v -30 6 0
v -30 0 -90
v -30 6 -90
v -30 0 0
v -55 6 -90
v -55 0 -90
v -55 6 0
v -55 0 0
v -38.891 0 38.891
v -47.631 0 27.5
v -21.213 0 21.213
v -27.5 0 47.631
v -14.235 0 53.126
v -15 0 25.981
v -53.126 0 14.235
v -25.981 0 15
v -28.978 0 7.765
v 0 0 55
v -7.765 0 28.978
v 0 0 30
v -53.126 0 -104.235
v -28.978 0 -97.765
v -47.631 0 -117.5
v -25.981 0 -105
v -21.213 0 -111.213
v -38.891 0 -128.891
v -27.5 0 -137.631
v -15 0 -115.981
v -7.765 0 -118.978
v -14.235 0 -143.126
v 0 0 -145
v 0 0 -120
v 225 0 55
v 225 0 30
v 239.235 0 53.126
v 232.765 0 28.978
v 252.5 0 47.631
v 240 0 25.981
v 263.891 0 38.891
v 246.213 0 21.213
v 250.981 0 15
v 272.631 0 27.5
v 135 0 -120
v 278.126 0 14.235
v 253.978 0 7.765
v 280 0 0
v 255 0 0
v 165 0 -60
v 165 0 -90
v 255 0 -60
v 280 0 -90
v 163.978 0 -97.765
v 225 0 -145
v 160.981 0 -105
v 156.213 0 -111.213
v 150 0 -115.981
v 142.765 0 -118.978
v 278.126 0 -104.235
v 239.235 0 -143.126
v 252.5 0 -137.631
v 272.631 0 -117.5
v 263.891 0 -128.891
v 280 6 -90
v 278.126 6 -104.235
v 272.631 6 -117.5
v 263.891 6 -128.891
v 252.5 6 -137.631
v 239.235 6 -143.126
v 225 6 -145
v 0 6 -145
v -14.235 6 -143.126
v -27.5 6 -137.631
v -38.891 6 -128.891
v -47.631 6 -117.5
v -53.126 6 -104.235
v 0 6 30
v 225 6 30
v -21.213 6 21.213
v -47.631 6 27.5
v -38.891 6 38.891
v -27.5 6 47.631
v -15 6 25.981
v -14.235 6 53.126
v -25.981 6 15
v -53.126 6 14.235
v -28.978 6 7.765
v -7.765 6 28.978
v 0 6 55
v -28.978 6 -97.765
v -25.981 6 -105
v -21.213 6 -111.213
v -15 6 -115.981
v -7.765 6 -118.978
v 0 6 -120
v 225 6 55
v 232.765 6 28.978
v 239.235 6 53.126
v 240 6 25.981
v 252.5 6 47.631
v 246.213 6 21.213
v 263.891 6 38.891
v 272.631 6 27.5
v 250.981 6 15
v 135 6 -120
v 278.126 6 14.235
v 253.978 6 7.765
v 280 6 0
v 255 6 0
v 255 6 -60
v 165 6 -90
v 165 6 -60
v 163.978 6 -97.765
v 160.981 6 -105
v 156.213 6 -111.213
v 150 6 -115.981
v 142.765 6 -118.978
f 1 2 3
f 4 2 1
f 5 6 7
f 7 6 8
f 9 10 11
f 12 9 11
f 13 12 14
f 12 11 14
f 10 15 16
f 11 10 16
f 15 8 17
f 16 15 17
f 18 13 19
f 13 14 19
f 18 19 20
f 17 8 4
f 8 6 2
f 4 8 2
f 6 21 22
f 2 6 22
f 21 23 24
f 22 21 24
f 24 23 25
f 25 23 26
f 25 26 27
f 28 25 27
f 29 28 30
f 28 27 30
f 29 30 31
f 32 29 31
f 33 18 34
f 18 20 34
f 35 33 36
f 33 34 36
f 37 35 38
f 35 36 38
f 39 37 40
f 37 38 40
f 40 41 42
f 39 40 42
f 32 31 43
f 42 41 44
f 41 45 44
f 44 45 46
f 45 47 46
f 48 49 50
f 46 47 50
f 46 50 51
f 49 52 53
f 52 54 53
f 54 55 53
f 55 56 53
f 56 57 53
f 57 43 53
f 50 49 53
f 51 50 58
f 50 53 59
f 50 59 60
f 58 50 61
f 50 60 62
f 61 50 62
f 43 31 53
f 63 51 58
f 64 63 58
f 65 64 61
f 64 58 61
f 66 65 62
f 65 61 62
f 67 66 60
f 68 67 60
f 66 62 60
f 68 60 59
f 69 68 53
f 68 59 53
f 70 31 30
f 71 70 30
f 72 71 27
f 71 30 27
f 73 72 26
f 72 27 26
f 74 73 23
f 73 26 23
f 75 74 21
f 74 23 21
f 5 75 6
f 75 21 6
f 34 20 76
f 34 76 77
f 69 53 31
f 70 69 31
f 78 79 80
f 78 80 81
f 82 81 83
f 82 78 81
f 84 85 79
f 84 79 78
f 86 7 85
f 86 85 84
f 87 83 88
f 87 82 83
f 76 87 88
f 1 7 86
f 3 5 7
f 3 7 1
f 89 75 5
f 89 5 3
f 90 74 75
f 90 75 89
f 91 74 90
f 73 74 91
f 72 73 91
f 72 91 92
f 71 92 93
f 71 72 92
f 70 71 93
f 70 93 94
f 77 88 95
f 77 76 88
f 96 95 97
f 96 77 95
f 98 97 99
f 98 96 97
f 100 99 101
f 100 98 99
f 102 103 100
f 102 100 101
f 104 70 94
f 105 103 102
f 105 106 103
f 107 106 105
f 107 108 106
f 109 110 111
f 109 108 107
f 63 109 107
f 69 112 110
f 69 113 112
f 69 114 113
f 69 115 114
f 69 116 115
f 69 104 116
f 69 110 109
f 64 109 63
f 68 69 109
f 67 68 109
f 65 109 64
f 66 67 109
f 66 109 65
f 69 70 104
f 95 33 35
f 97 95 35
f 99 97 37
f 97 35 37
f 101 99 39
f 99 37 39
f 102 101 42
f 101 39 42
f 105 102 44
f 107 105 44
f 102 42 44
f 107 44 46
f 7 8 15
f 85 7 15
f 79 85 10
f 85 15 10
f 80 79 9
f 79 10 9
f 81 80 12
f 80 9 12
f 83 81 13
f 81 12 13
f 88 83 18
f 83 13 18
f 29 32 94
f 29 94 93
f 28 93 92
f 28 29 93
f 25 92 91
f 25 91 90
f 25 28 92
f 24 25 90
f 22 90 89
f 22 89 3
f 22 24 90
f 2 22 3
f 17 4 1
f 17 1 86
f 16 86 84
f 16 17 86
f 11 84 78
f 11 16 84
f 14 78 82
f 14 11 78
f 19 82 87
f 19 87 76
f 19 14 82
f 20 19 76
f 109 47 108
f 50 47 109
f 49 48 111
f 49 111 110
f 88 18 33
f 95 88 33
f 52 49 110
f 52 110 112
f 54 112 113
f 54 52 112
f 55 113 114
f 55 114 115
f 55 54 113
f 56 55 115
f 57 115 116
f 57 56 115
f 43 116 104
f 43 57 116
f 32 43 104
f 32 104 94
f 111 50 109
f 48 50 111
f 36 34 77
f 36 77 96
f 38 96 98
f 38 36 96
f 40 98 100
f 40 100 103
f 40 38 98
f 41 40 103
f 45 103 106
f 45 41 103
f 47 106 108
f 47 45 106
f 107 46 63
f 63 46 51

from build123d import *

# Parameters (mm, degrees)
BOSS_EXTRUDE1_DEPTH = 6


with BuildPart() as part:
    # Sketch1 → Boss-Extrude1 (new body)
    with BuildSketch(Plane(origin=(0, 0, 0), x_dir=(1, 0, 0), z_dir=(0, 1, 0))):
        with BuildLine():
            Line((0, -55), (225, -55))
            ThreePointArc((225, -55), (263.890872965, -38.890872965), (280, 0))
            Line((280, 0), (280, 90))
            ThreePointArc((280, 90), (263.890872965, 128.890872965), (225, 145))
            Line((225, 145), (0, 145))
            ThreePointArc((0, 145), (-38.890872965, 128.890872965), (-55, 90))
            Line((-55, 90), (-55, 0))
            ThreePointArc((-55, 0), (-38.890872965, -38.890872965), (0, -55))
        make_face()
        with BuildLine():
            Line((0, -30), (225, -30))
            ThreePointArc((225, -30), (246.213203436, -21.213203436), (255, 0))
            Line((255, 0), (255, 60))
            Line((255, 60), (165, 60))
            Line((165, 60), (165, 90))
            ThreePointArc((165, 90), (156.213203436, 111.213203436), (135, 120))
            Line((135, 120), (0, 120))
            ThreePointArc((0, 120), (-21.213203436, 111.213203436), (-30, 90))
            Line((-30, 90), (-30, 0))
            ThreePointArc((-30, 0), (-21.213203436, -21.213203436), (0, -30))
        make_face(mode=Mode.SUBTRACT)
    extrude(amount=BOSS_EXTRUDE1_DEPTH)


solid = part.part
